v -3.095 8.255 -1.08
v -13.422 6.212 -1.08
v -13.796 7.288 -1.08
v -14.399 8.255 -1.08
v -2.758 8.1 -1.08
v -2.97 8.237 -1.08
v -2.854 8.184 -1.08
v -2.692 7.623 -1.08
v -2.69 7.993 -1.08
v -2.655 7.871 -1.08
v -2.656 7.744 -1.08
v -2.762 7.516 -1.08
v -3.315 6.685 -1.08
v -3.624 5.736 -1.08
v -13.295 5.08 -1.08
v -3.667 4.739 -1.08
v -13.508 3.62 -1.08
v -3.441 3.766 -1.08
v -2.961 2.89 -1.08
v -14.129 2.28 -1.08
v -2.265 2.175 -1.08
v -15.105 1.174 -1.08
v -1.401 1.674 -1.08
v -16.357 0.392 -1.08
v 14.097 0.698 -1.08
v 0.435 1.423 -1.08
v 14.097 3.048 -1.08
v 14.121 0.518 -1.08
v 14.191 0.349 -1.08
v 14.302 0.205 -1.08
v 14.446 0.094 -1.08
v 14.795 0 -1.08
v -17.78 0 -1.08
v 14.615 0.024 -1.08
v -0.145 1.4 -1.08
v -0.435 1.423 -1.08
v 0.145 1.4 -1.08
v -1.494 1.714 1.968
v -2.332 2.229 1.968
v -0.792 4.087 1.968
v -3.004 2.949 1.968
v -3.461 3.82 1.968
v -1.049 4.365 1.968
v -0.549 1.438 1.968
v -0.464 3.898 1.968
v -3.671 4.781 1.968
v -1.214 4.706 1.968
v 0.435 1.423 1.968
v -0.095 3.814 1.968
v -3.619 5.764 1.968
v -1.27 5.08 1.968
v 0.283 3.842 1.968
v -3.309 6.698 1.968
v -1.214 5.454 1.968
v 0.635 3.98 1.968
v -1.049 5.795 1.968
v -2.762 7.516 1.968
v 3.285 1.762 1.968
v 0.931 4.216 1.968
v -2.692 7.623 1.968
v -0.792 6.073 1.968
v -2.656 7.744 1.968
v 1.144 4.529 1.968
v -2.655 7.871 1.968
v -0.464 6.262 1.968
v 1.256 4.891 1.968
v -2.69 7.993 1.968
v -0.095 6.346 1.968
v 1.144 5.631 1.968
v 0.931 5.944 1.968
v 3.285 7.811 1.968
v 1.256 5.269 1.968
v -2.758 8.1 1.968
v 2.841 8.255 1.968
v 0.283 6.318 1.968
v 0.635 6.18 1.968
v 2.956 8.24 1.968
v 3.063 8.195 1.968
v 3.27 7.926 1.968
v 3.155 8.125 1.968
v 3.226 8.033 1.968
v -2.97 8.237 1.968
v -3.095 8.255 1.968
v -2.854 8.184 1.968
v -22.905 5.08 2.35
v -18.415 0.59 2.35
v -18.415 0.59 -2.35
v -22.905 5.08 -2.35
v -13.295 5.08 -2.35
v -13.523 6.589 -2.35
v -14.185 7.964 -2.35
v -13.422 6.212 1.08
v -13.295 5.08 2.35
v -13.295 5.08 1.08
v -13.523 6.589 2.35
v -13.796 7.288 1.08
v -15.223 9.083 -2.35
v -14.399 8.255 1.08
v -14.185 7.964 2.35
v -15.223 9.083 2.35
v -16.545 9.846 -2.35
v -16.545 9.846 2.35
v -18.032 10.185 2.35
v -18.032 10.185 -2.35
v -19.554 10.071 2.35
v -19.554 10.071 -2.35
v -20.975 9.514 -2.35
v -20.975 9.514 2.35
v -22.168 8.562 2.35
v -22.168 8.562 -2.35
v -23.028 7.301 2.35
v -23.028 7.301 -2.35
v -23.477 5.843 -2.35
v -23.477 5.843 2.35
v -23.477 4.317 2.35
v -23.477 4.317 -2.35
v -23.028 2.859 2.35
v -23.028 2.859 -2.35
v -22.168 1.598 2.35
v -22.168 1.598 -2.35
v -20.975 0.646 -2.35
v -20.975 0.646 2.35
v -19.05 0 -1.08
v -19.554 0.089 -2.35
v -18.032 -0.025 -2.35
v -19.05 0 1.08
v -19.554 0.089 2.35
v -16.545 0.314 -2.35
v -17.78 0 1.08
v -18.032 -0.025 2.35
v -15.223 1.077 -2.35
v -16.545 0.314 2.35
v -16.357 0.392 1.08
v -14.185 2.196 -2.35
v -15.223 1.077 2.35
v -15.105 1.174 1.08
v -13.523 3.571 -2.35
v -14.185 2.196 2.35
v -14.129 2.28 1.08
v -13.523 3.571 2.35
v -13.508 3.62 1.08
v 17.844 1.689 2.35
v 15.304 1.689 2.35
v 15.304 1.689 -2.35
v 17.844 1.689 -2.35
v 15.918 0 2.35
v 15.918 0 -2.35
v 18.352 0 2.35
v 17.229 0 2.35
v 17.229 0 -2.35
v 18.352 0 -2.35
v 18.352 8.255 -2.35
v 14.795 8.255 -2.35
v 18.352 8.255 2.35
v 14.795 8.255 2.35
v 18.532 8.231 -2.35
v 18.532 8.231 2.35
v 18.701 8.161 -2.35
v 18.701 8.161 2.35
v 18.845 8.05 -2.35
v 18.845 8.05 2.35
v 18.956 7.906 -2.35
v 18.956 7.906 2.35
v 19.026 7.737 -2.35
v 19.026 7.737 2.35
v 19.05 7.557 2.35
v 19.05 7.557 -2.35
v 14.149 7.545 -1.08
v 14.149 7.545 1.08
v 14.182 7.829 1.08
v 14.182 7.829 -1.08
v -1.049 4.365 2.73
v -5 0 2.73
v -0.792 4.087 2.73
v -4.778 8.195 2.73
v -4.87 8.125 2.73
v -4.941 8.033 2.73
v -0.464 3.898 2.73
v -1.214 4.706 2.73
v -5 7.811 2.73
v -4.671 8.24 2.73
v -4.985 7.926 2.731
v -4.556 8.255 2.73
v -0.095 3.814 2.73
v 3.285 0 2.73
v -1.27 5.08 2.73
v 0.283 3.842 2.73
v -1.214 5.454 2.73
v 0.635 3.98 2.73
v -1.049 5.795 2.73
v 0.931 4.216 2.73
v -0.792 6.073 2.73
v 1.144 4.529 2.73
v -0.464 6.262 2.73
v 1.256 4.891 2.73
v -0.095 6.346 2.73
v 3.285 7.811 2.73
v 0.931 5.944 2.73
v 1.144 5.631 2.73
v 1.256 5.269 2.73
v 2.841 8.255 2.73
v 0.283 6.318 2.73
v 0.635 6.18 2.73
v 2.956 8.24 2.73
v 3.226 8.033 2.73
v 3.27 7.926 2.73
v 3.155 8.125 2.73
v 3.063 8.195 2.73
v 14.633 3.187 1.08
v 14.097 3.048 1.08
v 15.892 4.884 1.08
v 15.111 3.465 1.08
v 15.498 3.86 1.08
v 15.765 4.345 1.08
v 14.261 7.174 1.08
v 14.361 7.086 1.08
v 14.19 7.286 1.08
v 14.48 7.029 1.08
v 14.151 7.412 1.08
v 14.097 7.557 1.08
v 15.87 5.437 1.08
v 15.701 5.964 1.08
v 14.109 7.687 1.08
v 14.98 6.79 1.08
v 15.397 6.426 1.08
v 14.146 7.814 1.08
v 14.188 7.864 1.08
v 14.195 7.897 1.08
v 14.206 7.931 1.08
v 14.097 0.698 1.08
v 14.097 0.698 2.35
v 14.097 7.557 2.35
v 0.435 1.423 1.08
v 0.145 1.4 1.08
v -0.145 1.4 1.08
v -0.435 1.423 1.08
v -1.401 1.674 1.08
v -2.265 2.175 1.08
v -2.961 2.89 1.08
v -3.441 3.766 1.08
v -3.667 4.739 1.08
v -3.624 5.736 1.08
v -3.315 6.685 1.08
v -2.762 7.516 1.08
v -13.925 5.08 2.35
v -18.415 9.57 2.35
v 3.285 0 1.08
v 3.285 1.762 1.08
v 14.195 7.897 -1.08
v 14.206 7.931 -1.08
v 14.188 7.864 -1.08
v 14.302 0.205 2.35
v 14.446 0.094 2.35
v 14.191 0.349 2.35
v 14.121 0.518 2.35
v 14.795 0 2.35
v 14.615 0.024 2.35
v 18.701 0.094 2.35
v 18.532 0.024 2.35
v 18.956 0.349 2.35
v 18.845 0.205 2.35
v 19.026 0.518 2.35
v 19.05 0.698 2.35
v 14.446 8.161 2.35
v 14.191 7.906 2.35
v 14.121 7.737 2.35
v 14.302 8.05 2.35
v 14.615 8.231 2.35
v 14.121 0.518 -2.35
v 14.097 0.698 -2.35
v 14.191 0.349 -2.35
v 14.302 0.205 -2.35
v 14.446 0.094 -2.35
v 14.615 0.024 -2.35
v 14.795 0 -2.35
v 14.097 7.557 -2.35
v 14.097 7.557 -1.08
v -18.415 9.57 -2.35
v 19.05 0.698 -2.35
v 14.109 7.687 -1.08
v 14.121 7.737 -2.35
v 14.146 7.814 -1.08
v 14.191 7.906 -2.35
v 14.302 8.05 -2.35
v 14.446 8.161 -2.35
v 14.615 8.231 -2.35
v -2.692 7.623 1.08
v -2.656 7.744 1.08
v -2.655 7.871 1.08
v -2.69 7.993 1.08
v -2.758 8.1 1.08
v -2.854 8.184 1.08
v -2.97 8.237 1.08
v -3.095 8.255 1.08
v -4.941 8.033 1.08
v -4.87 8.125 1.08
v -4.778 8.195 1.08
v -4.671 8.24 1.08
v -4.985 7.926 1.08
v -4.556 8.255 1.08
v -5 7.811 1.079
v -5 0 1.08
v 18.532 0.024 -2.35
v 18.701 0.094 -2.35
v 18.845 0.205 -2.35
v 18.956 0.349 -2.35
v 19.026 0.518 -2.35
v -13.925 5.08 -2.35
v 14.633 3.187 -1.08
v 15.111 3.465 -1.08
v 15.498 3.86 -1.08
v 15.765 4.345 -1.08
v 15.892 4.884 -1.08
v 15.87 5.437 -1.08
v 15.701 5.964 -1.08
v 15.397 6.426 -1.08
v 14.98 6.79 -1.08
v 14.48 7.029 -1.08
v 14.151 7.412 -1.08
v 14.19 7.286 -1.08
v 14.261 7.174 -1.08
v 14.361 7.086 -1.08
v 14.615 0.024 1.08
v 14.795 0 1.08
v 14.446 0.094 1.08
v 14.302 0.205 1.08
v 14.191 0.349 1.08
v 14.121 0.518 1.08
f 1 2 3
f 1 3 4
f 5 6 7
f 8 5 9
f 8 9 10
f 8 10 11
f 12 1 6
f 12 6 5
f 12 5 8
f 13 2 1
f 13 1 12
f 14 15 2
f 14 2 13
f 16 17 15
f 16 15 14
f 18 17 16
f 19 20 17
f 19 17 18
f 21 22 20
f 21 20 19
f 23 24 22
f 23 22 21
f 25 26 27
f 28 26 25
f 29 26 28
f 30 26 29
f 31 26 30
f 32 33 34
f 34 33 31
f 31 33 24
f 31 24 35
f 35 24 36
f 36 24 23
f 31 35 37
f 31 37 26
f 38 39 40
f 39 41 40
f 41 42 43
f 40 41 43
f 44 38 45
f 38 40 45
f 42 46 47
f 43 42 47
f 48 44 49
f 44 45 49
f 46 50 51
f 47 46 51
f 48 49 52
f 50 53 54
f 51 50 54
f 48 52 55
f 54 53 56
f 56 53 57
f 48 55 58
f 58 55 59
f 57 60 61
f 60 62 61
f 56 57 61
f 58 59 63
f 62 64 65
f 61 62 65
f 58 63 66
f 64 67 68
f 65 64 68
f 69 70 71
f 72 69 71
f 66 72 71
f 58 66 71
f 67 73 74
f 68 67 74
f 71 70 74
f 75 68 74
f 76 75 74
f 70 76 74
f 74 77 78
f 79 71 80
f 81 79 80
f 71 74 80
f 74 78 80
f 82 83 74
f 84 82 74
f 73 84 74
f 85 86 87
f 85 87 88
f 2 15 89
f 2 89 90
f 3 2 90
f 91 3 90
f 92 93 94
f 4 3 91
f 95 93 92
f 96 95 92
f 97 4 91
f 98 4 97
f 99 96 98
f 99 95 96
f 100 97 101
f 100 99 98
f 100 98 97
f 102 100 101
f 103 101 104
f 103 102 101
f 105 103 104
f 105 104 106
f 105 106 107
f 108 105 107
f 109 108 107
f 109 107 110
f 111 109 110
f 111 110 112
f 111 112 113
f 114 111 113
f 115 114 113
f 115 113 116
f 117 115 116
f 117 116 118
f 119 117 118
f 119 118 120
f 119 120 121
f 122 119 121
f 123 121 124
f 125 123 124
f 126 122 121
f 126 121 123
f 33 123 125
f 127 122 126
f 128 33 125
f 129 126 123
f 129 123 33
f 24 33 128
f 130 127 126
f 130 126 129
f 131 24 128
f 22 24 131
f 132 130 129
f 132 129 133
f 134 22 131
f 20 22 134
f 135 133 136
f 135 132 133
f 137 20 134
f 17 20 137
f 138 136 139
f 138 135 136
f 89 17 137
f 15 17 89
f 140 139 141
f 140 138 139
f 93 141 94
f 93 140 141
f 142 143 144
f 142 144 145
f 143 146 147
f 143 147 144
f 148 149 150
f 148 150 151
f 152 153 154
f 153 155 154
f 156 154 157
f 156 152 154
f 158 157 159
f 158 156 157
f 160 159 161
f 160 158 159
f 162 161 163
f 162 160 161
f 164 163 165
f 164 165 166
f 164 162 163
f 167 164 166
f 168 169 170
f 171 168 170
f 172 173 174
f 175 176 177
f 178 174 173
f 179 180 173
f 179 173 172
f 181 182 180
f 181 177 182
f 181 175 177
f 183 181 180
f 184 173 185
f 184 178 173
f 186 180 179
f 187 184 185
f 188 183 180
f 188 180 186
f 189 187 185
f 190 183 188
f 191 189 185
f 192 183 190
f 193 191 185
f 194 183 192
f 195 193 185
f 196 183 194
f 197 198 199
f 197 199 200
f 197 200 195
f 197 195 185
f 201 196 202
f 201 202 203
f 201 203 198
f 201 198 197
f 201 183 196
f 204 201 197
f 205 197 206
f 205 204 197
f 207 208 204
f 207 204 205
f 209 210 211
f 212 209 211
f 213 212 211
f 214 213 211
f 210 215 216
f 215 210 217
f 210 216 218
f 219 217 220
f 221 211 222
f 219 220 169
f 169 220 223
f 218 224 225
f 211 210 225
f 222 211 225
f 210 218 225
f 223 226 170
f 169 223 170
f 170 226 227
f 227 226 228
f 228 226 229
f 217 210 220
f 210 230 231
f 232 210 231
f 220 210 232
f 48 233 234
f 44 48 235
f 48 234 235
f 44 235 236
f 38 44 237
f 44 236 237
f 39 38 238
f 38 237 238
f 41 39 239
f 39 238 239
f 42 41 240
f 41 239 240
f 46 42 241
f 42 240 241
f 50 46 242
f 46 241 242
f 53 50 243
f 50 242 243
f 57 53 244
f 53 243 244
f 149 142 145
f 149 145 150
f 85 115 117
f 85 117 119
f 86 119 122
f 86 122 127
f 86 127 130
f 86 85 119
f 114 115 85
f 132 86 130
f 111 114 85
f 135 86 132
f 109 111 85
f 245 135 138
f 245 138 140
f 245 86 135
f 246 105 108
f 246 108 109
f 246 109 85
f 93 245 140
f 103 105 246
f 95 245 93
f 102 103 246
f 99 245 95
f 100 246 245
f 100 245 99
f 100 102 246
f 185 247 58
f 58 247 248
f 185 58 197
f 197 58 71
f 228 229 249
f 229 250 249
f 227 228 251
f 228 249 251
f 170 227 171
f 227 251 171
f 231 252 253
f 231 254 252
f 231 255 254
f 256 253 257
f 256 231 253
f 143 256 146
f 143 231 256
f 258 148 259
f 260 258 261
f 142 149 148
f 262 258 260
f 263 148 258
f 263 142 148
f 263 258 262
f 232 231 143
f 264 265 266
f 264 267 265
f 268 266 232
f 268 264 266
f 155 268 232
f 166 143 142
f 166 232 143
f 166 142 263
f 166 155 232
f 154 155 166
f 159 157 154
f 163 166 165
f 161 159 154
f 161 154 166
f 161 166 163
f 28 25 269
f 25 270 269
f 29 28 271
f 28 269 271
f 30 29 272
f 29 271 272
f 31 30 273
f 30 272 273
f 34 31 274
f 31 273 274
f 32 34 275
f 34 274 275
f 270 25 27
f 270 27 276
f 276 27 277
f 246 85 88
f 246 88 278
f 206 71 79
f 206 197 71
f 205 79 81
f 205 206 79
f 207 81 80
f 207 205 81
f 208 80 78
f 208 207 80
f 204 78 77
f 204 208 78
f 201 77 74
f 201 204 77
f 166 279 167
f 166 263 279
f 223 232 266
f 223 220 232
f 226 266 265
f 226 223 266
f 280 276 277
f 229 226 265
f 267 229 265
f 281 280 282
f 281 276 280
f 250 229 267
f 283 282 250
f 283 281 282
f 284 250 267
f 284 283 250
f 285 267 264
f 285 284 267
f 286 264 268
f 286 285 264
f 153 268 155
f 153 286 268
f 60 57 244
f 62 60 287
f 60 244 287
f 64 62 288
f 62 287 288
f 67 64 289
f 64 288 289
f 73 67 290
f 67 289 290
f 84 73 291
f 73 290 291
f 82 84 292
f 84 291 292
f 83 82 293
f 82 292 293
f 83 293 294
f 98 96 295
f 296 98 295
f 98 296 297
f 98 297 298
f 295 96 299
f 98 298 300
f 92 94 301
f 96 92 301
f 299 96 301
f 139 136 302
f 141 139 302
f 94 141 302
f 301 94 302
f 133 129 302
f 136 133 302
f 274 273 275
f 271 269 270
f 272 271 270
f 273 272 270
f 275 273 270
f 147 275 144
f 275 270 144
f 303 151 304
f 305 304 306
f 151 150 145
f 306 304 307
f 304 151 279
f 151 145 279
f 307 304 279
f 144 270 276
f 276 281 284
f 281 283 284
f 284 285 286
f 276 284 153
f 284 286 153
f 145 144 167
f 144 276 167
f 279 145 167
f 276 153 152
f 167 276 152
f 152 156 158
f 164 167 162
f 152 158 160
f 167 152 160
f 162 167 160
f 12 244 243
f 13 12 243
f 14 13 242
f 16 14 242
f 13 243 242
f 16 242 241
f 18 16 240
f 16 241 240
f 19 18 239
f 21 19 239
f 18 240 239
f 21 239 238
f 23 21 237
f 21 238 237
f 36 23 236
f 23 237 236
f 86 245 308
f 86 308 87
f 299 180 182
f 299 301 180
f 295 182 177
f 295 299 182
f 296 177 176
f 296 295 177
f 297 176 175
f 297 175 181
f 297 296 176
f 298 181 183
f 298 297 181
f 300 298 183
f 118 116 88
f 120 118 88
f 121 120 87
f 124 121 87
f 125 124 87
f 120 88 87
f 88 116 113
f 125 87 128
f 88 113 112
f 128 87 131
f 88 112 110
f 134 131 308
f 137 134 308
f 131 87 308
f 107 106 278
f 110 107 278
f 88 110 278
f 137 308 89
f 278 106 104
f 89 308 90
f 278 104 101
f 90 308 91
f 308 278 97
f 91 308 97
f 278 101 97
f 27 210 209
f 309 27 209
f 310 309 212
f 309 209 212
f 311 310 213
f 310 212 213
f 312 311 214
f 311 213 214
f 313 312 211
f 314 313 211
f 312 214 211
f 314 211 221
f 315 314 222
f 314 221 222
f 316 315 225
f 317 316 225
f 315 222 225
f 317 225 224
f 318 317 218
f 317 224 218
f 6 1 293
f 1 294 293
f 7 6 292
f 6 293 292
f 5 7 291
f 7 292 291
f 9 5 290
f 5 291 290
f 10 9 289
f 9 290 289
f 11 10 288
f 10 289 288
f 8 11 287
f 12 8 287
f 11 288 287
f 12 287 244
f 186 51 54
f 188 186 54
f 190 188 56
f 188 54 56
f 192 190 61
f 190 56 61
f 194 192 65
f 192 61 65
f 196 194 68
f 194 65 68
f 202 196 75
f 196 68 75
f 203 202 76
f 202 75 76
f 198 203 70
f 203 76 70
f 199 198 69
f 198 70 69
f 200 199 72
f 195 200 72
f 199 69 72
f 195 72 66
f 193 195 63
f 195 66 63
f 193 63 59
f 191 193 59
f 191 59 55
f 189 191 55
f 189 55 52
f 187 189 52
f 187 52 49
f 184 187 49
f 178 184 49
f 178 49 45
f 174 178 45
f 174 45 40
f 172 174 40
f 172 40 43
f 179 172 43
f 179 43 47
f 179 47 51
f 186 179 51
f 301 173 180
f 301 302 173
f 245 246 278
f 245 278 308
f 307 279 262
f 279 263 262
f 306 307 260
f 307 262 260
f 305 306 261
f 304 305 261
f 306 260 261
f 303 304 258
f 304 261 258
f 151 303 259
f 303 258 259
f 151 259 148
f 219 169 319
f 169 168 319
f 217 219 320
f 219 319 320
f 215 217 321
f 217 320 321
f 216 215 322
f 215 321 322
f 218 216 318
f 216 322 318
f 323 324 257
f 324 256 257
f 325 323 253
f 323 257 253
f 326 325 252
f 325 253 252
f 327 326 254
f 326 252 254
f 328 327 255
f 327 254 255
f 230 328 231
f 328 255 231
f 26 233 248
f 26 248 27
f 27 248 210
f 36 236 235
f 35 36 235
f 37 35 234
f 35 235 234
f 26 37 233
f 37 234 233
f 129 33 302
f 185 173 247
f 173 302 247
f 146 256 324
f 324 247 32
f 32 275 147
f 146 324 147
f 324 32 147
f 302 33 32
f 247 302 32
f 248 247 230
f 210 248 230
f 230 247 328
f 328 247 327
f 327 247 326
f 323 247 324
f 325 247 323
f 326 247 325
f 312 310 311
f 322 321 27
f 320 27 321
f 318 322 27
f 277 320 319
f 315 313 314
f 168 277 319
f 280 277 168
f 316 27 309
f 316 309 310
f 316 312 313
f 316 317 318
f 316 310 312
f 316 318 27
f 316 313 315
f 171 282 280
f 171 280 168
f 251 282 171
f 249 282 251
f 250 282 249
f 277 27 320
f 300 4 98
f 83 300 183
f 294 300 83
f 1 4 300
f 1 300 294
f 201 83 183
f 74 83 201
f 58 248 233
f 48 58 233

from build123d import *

# Parameters (mm, degrees)
SKETCH1_W           = 38.1
SKETCH1_H           = 2.159
BOSS_EXTRUDE1_DEPTH = 8.255
CUT_EXTRUDE1_DEPTH  = 12.7
FILLET5_R           = 0.4826
FILLET7_R           = 0.4445
SKETCH3_W           = 4.953
SKETCH3_H           = 8.255
BOSS_EXTRUDE2_DEPTH = 1.27
CUT_EXTRUDE4_DEPTH  = 5.699
FILLET9_R           = 0.6985
SKETCH4_R           = 5.11953367
BOSS_EXTRUDE3_DEPTH = 4.699
CUT_EXTRUDE3_DEPTH  = 4.699
BOSS_EXTRUDE4_DEPTH = 0.889
SKETCH10_W          = 8.28565978
SKETCH10_H          = 8.255
BOSS_EXTRUDE5_DEPTH = 0.762
FILLET10_R          = 0.4445
SKETCH11_R          = 1.27
CUT_EXTRUDE5_DEPTH  = 1.762


with BuildPart() as part:
    # Sketch1 → Boss-Extrude1 (new body)
    with BuildSketch(Plane(origin=(0, 0, 0), x_dir=(1, 0, 0), z_dir=(0, 1, 0))):
        Rectangle(SKETCH1_W, SKETCH1_H)
    extrude(amount=BOSS_EXTRUDE1_DEPTH)

    # Sketch2 → Cut-Extrude1 (cut)
    with BuildSketch(Plane.XY.offset(1.0795)):
        with BuildLine():
            Line((0.435059279, 1.422786249), (14.097, 3.048))
            ThreePointArc((14.097, 3.048), (15.901602081, 5.08), (14.097, 7.112))
            Line((14.097, 7.112), (14.839370062, 13.352542684))
            Line((14.839370062, 13.352542684), (0.435059279, 13.41059889))
            Line((0.435059279, 13.41059889), (-0.435059279, 13.41059889))
            Line((-0.435059279, 13.41059889), (0, 8.763))
            ThreePointArc((0, 8.763), (-3.676547786, 5.297911397), (-0.435059279, 1.422786249))
            ThreePointArc((-0.435059279, 1.422786249), (0, 1.397), (0.435059279, 1.422786249))
        make_face()
    extrude(amount=-CUT_EXTRUDE1_DEPTH, mode=Mode.SUBTRACT)

    # Fillet5
    fillet5_edges = [part.edges().sort_by_distance(p)[0] for p in [
        (14.232970383, 8.255, 0),
        (14.097, 7.112, 0),
    ]]
    fillet(fillet5_edges, radius=FILLET5_R)

    # Fillet7
    fillet7_edges = [part.edges().sort_by_distance(p)[0] for p in [
        (-1.866511184, 8.255, 0),
    ]]
    fillet(fillet7_edges, radius=FILLET7_R)

    # Sketch3 → Boss-Extrude2 (add)
    with BuildSketch(Plane.XY.offset(1.0795)):
        with Locations((16.5735, 4.1275)):
            Rectangle(SKETCH3_W, SKETCH3_H)
    boss_extrude2 = extrude(amount=BOSS_EXTRUDE2_DEPTH)

    # Mirror2: Boss-Extrude2 across plane
    add(boss_extrude2.mirror(Plane.XY))

    # Sketch8 → Cut-Extrude4 (cut, through all)
    with BuildSketch(Plane.XY.offset(2.3495)):
        Polygon((15.3035, 1.6891), (17.8435, 1.6891), (17.228717877, 0), (15.918282123, 0), align=None)
    extrude(amount=-CUT_EXTRUDE4_DEPTH, mode=Mode.SUBTRACT)

    # Fillet9
    fillet9_edges = [part.edges().sort_by_distance(p)[0] for p in [
        (14.097, 0, -1.7145),
        (14.097, 0, 1.7145),
        (14.097, 8.255, -1.7145),
        (19.05, 0, 0),
        (19.05, 8.255, 0),
    ]]
    fillet(fillet9_edges, radius=FILLET9_R)

    # Sketch4 → Boss-Extrude3 (add)
    with BuildSketch(Plane.XY.offset(2.3495)):
        with Locations((-18.415, 5.08)):
            Circle(SKETCH4_R)
        Polygon((-18.415, 0.589871939), (-22.905128061, 5.08), (-18.415, 9.570128061), (-13.924871939, 5.08), align=None, mode=Mode.SUBTRACT)
    extrude(amount=-BOSS_EXTRUDE3_DEPTH)

    # Sketch7 → Cut-Extrude3 (cut)
    with BuildSketch(Plane.XY.offset(2.3495)):
        Polygon((-22.905128061, 5.08), (-18.415, 9.570128061), (-13.924871939, 5.08), (-18.415, 0.589871939), align=None)
    extrude(amount=-CUT_EXTRUDE3_DEPTH, mode=Mode.SUBTRACT)

    # Sketch9 → Boss-Extrude4 (add)
    with BuildSketch(Plane.XY.offset(1.0795)):
        with BuildLine():
            Line((-3.095258632, 8.255), (-5.000258632, 8.255))
            Line((-5.000258632, 8.255), (-5.000258632, 0))
            Line((-5.000258632, 0), (0.110401148, 0))
            Line((0.110401148, 0), (3.285401148, 0))
            Line((3.285401148, 0), (3.285401148, 1.761860681))
            Line((3.285401148, 1.761860681), (0.435059279, 1.422786249))
            ThreePointArc((0.435059279, 1.422786249), (-3.261402544, 3.368935289), (-2.761923087, 7.516446154))
            ThreePointArc((-2.761923087, 7.516446154), (-2.690112248, 7.993356932), (-3.095258632, 8.255))
        make_face()
    extrude(amount=BOSS_EXTRUDE4_DEPTH)

    # Sketch10 → Boss-Extrude5 (add)
    with BuildSketch(Plane.XY.offset(1.9685)):
        with Locations((-0.857428742, 4.1275)):
            Rectangle(SKETCH10_W, SKETCH10_H)
    extrude(amount=BOSS_EXTRUDE5_DEPTH)

    # Fillet10
    fillet10_edges = [part.edges().sort_by_distance(p)[0] for p in [
        (-5.000258632, 8.255, 1.905),
        (3.285401148, 8.255, 2.3495),
    ]]
    fillet(fillet10_edges, radius=FILLET10_R)

    # Sketch11 → Cut-Extrude5 (cut, through all)
    with BuildSketch(Plane(origin=(0, 0, 1.9685), x_dir=(-1, 0, 0), z_dir=(0, 0, -1))):
        with Locations((0, 5.08)):
            Circle(SKETCH11_R)
    extrude(amount=-CUT_EXTRUDE5_DEPTH, mode=Mode.SUBTRACT)


solid = part.part
